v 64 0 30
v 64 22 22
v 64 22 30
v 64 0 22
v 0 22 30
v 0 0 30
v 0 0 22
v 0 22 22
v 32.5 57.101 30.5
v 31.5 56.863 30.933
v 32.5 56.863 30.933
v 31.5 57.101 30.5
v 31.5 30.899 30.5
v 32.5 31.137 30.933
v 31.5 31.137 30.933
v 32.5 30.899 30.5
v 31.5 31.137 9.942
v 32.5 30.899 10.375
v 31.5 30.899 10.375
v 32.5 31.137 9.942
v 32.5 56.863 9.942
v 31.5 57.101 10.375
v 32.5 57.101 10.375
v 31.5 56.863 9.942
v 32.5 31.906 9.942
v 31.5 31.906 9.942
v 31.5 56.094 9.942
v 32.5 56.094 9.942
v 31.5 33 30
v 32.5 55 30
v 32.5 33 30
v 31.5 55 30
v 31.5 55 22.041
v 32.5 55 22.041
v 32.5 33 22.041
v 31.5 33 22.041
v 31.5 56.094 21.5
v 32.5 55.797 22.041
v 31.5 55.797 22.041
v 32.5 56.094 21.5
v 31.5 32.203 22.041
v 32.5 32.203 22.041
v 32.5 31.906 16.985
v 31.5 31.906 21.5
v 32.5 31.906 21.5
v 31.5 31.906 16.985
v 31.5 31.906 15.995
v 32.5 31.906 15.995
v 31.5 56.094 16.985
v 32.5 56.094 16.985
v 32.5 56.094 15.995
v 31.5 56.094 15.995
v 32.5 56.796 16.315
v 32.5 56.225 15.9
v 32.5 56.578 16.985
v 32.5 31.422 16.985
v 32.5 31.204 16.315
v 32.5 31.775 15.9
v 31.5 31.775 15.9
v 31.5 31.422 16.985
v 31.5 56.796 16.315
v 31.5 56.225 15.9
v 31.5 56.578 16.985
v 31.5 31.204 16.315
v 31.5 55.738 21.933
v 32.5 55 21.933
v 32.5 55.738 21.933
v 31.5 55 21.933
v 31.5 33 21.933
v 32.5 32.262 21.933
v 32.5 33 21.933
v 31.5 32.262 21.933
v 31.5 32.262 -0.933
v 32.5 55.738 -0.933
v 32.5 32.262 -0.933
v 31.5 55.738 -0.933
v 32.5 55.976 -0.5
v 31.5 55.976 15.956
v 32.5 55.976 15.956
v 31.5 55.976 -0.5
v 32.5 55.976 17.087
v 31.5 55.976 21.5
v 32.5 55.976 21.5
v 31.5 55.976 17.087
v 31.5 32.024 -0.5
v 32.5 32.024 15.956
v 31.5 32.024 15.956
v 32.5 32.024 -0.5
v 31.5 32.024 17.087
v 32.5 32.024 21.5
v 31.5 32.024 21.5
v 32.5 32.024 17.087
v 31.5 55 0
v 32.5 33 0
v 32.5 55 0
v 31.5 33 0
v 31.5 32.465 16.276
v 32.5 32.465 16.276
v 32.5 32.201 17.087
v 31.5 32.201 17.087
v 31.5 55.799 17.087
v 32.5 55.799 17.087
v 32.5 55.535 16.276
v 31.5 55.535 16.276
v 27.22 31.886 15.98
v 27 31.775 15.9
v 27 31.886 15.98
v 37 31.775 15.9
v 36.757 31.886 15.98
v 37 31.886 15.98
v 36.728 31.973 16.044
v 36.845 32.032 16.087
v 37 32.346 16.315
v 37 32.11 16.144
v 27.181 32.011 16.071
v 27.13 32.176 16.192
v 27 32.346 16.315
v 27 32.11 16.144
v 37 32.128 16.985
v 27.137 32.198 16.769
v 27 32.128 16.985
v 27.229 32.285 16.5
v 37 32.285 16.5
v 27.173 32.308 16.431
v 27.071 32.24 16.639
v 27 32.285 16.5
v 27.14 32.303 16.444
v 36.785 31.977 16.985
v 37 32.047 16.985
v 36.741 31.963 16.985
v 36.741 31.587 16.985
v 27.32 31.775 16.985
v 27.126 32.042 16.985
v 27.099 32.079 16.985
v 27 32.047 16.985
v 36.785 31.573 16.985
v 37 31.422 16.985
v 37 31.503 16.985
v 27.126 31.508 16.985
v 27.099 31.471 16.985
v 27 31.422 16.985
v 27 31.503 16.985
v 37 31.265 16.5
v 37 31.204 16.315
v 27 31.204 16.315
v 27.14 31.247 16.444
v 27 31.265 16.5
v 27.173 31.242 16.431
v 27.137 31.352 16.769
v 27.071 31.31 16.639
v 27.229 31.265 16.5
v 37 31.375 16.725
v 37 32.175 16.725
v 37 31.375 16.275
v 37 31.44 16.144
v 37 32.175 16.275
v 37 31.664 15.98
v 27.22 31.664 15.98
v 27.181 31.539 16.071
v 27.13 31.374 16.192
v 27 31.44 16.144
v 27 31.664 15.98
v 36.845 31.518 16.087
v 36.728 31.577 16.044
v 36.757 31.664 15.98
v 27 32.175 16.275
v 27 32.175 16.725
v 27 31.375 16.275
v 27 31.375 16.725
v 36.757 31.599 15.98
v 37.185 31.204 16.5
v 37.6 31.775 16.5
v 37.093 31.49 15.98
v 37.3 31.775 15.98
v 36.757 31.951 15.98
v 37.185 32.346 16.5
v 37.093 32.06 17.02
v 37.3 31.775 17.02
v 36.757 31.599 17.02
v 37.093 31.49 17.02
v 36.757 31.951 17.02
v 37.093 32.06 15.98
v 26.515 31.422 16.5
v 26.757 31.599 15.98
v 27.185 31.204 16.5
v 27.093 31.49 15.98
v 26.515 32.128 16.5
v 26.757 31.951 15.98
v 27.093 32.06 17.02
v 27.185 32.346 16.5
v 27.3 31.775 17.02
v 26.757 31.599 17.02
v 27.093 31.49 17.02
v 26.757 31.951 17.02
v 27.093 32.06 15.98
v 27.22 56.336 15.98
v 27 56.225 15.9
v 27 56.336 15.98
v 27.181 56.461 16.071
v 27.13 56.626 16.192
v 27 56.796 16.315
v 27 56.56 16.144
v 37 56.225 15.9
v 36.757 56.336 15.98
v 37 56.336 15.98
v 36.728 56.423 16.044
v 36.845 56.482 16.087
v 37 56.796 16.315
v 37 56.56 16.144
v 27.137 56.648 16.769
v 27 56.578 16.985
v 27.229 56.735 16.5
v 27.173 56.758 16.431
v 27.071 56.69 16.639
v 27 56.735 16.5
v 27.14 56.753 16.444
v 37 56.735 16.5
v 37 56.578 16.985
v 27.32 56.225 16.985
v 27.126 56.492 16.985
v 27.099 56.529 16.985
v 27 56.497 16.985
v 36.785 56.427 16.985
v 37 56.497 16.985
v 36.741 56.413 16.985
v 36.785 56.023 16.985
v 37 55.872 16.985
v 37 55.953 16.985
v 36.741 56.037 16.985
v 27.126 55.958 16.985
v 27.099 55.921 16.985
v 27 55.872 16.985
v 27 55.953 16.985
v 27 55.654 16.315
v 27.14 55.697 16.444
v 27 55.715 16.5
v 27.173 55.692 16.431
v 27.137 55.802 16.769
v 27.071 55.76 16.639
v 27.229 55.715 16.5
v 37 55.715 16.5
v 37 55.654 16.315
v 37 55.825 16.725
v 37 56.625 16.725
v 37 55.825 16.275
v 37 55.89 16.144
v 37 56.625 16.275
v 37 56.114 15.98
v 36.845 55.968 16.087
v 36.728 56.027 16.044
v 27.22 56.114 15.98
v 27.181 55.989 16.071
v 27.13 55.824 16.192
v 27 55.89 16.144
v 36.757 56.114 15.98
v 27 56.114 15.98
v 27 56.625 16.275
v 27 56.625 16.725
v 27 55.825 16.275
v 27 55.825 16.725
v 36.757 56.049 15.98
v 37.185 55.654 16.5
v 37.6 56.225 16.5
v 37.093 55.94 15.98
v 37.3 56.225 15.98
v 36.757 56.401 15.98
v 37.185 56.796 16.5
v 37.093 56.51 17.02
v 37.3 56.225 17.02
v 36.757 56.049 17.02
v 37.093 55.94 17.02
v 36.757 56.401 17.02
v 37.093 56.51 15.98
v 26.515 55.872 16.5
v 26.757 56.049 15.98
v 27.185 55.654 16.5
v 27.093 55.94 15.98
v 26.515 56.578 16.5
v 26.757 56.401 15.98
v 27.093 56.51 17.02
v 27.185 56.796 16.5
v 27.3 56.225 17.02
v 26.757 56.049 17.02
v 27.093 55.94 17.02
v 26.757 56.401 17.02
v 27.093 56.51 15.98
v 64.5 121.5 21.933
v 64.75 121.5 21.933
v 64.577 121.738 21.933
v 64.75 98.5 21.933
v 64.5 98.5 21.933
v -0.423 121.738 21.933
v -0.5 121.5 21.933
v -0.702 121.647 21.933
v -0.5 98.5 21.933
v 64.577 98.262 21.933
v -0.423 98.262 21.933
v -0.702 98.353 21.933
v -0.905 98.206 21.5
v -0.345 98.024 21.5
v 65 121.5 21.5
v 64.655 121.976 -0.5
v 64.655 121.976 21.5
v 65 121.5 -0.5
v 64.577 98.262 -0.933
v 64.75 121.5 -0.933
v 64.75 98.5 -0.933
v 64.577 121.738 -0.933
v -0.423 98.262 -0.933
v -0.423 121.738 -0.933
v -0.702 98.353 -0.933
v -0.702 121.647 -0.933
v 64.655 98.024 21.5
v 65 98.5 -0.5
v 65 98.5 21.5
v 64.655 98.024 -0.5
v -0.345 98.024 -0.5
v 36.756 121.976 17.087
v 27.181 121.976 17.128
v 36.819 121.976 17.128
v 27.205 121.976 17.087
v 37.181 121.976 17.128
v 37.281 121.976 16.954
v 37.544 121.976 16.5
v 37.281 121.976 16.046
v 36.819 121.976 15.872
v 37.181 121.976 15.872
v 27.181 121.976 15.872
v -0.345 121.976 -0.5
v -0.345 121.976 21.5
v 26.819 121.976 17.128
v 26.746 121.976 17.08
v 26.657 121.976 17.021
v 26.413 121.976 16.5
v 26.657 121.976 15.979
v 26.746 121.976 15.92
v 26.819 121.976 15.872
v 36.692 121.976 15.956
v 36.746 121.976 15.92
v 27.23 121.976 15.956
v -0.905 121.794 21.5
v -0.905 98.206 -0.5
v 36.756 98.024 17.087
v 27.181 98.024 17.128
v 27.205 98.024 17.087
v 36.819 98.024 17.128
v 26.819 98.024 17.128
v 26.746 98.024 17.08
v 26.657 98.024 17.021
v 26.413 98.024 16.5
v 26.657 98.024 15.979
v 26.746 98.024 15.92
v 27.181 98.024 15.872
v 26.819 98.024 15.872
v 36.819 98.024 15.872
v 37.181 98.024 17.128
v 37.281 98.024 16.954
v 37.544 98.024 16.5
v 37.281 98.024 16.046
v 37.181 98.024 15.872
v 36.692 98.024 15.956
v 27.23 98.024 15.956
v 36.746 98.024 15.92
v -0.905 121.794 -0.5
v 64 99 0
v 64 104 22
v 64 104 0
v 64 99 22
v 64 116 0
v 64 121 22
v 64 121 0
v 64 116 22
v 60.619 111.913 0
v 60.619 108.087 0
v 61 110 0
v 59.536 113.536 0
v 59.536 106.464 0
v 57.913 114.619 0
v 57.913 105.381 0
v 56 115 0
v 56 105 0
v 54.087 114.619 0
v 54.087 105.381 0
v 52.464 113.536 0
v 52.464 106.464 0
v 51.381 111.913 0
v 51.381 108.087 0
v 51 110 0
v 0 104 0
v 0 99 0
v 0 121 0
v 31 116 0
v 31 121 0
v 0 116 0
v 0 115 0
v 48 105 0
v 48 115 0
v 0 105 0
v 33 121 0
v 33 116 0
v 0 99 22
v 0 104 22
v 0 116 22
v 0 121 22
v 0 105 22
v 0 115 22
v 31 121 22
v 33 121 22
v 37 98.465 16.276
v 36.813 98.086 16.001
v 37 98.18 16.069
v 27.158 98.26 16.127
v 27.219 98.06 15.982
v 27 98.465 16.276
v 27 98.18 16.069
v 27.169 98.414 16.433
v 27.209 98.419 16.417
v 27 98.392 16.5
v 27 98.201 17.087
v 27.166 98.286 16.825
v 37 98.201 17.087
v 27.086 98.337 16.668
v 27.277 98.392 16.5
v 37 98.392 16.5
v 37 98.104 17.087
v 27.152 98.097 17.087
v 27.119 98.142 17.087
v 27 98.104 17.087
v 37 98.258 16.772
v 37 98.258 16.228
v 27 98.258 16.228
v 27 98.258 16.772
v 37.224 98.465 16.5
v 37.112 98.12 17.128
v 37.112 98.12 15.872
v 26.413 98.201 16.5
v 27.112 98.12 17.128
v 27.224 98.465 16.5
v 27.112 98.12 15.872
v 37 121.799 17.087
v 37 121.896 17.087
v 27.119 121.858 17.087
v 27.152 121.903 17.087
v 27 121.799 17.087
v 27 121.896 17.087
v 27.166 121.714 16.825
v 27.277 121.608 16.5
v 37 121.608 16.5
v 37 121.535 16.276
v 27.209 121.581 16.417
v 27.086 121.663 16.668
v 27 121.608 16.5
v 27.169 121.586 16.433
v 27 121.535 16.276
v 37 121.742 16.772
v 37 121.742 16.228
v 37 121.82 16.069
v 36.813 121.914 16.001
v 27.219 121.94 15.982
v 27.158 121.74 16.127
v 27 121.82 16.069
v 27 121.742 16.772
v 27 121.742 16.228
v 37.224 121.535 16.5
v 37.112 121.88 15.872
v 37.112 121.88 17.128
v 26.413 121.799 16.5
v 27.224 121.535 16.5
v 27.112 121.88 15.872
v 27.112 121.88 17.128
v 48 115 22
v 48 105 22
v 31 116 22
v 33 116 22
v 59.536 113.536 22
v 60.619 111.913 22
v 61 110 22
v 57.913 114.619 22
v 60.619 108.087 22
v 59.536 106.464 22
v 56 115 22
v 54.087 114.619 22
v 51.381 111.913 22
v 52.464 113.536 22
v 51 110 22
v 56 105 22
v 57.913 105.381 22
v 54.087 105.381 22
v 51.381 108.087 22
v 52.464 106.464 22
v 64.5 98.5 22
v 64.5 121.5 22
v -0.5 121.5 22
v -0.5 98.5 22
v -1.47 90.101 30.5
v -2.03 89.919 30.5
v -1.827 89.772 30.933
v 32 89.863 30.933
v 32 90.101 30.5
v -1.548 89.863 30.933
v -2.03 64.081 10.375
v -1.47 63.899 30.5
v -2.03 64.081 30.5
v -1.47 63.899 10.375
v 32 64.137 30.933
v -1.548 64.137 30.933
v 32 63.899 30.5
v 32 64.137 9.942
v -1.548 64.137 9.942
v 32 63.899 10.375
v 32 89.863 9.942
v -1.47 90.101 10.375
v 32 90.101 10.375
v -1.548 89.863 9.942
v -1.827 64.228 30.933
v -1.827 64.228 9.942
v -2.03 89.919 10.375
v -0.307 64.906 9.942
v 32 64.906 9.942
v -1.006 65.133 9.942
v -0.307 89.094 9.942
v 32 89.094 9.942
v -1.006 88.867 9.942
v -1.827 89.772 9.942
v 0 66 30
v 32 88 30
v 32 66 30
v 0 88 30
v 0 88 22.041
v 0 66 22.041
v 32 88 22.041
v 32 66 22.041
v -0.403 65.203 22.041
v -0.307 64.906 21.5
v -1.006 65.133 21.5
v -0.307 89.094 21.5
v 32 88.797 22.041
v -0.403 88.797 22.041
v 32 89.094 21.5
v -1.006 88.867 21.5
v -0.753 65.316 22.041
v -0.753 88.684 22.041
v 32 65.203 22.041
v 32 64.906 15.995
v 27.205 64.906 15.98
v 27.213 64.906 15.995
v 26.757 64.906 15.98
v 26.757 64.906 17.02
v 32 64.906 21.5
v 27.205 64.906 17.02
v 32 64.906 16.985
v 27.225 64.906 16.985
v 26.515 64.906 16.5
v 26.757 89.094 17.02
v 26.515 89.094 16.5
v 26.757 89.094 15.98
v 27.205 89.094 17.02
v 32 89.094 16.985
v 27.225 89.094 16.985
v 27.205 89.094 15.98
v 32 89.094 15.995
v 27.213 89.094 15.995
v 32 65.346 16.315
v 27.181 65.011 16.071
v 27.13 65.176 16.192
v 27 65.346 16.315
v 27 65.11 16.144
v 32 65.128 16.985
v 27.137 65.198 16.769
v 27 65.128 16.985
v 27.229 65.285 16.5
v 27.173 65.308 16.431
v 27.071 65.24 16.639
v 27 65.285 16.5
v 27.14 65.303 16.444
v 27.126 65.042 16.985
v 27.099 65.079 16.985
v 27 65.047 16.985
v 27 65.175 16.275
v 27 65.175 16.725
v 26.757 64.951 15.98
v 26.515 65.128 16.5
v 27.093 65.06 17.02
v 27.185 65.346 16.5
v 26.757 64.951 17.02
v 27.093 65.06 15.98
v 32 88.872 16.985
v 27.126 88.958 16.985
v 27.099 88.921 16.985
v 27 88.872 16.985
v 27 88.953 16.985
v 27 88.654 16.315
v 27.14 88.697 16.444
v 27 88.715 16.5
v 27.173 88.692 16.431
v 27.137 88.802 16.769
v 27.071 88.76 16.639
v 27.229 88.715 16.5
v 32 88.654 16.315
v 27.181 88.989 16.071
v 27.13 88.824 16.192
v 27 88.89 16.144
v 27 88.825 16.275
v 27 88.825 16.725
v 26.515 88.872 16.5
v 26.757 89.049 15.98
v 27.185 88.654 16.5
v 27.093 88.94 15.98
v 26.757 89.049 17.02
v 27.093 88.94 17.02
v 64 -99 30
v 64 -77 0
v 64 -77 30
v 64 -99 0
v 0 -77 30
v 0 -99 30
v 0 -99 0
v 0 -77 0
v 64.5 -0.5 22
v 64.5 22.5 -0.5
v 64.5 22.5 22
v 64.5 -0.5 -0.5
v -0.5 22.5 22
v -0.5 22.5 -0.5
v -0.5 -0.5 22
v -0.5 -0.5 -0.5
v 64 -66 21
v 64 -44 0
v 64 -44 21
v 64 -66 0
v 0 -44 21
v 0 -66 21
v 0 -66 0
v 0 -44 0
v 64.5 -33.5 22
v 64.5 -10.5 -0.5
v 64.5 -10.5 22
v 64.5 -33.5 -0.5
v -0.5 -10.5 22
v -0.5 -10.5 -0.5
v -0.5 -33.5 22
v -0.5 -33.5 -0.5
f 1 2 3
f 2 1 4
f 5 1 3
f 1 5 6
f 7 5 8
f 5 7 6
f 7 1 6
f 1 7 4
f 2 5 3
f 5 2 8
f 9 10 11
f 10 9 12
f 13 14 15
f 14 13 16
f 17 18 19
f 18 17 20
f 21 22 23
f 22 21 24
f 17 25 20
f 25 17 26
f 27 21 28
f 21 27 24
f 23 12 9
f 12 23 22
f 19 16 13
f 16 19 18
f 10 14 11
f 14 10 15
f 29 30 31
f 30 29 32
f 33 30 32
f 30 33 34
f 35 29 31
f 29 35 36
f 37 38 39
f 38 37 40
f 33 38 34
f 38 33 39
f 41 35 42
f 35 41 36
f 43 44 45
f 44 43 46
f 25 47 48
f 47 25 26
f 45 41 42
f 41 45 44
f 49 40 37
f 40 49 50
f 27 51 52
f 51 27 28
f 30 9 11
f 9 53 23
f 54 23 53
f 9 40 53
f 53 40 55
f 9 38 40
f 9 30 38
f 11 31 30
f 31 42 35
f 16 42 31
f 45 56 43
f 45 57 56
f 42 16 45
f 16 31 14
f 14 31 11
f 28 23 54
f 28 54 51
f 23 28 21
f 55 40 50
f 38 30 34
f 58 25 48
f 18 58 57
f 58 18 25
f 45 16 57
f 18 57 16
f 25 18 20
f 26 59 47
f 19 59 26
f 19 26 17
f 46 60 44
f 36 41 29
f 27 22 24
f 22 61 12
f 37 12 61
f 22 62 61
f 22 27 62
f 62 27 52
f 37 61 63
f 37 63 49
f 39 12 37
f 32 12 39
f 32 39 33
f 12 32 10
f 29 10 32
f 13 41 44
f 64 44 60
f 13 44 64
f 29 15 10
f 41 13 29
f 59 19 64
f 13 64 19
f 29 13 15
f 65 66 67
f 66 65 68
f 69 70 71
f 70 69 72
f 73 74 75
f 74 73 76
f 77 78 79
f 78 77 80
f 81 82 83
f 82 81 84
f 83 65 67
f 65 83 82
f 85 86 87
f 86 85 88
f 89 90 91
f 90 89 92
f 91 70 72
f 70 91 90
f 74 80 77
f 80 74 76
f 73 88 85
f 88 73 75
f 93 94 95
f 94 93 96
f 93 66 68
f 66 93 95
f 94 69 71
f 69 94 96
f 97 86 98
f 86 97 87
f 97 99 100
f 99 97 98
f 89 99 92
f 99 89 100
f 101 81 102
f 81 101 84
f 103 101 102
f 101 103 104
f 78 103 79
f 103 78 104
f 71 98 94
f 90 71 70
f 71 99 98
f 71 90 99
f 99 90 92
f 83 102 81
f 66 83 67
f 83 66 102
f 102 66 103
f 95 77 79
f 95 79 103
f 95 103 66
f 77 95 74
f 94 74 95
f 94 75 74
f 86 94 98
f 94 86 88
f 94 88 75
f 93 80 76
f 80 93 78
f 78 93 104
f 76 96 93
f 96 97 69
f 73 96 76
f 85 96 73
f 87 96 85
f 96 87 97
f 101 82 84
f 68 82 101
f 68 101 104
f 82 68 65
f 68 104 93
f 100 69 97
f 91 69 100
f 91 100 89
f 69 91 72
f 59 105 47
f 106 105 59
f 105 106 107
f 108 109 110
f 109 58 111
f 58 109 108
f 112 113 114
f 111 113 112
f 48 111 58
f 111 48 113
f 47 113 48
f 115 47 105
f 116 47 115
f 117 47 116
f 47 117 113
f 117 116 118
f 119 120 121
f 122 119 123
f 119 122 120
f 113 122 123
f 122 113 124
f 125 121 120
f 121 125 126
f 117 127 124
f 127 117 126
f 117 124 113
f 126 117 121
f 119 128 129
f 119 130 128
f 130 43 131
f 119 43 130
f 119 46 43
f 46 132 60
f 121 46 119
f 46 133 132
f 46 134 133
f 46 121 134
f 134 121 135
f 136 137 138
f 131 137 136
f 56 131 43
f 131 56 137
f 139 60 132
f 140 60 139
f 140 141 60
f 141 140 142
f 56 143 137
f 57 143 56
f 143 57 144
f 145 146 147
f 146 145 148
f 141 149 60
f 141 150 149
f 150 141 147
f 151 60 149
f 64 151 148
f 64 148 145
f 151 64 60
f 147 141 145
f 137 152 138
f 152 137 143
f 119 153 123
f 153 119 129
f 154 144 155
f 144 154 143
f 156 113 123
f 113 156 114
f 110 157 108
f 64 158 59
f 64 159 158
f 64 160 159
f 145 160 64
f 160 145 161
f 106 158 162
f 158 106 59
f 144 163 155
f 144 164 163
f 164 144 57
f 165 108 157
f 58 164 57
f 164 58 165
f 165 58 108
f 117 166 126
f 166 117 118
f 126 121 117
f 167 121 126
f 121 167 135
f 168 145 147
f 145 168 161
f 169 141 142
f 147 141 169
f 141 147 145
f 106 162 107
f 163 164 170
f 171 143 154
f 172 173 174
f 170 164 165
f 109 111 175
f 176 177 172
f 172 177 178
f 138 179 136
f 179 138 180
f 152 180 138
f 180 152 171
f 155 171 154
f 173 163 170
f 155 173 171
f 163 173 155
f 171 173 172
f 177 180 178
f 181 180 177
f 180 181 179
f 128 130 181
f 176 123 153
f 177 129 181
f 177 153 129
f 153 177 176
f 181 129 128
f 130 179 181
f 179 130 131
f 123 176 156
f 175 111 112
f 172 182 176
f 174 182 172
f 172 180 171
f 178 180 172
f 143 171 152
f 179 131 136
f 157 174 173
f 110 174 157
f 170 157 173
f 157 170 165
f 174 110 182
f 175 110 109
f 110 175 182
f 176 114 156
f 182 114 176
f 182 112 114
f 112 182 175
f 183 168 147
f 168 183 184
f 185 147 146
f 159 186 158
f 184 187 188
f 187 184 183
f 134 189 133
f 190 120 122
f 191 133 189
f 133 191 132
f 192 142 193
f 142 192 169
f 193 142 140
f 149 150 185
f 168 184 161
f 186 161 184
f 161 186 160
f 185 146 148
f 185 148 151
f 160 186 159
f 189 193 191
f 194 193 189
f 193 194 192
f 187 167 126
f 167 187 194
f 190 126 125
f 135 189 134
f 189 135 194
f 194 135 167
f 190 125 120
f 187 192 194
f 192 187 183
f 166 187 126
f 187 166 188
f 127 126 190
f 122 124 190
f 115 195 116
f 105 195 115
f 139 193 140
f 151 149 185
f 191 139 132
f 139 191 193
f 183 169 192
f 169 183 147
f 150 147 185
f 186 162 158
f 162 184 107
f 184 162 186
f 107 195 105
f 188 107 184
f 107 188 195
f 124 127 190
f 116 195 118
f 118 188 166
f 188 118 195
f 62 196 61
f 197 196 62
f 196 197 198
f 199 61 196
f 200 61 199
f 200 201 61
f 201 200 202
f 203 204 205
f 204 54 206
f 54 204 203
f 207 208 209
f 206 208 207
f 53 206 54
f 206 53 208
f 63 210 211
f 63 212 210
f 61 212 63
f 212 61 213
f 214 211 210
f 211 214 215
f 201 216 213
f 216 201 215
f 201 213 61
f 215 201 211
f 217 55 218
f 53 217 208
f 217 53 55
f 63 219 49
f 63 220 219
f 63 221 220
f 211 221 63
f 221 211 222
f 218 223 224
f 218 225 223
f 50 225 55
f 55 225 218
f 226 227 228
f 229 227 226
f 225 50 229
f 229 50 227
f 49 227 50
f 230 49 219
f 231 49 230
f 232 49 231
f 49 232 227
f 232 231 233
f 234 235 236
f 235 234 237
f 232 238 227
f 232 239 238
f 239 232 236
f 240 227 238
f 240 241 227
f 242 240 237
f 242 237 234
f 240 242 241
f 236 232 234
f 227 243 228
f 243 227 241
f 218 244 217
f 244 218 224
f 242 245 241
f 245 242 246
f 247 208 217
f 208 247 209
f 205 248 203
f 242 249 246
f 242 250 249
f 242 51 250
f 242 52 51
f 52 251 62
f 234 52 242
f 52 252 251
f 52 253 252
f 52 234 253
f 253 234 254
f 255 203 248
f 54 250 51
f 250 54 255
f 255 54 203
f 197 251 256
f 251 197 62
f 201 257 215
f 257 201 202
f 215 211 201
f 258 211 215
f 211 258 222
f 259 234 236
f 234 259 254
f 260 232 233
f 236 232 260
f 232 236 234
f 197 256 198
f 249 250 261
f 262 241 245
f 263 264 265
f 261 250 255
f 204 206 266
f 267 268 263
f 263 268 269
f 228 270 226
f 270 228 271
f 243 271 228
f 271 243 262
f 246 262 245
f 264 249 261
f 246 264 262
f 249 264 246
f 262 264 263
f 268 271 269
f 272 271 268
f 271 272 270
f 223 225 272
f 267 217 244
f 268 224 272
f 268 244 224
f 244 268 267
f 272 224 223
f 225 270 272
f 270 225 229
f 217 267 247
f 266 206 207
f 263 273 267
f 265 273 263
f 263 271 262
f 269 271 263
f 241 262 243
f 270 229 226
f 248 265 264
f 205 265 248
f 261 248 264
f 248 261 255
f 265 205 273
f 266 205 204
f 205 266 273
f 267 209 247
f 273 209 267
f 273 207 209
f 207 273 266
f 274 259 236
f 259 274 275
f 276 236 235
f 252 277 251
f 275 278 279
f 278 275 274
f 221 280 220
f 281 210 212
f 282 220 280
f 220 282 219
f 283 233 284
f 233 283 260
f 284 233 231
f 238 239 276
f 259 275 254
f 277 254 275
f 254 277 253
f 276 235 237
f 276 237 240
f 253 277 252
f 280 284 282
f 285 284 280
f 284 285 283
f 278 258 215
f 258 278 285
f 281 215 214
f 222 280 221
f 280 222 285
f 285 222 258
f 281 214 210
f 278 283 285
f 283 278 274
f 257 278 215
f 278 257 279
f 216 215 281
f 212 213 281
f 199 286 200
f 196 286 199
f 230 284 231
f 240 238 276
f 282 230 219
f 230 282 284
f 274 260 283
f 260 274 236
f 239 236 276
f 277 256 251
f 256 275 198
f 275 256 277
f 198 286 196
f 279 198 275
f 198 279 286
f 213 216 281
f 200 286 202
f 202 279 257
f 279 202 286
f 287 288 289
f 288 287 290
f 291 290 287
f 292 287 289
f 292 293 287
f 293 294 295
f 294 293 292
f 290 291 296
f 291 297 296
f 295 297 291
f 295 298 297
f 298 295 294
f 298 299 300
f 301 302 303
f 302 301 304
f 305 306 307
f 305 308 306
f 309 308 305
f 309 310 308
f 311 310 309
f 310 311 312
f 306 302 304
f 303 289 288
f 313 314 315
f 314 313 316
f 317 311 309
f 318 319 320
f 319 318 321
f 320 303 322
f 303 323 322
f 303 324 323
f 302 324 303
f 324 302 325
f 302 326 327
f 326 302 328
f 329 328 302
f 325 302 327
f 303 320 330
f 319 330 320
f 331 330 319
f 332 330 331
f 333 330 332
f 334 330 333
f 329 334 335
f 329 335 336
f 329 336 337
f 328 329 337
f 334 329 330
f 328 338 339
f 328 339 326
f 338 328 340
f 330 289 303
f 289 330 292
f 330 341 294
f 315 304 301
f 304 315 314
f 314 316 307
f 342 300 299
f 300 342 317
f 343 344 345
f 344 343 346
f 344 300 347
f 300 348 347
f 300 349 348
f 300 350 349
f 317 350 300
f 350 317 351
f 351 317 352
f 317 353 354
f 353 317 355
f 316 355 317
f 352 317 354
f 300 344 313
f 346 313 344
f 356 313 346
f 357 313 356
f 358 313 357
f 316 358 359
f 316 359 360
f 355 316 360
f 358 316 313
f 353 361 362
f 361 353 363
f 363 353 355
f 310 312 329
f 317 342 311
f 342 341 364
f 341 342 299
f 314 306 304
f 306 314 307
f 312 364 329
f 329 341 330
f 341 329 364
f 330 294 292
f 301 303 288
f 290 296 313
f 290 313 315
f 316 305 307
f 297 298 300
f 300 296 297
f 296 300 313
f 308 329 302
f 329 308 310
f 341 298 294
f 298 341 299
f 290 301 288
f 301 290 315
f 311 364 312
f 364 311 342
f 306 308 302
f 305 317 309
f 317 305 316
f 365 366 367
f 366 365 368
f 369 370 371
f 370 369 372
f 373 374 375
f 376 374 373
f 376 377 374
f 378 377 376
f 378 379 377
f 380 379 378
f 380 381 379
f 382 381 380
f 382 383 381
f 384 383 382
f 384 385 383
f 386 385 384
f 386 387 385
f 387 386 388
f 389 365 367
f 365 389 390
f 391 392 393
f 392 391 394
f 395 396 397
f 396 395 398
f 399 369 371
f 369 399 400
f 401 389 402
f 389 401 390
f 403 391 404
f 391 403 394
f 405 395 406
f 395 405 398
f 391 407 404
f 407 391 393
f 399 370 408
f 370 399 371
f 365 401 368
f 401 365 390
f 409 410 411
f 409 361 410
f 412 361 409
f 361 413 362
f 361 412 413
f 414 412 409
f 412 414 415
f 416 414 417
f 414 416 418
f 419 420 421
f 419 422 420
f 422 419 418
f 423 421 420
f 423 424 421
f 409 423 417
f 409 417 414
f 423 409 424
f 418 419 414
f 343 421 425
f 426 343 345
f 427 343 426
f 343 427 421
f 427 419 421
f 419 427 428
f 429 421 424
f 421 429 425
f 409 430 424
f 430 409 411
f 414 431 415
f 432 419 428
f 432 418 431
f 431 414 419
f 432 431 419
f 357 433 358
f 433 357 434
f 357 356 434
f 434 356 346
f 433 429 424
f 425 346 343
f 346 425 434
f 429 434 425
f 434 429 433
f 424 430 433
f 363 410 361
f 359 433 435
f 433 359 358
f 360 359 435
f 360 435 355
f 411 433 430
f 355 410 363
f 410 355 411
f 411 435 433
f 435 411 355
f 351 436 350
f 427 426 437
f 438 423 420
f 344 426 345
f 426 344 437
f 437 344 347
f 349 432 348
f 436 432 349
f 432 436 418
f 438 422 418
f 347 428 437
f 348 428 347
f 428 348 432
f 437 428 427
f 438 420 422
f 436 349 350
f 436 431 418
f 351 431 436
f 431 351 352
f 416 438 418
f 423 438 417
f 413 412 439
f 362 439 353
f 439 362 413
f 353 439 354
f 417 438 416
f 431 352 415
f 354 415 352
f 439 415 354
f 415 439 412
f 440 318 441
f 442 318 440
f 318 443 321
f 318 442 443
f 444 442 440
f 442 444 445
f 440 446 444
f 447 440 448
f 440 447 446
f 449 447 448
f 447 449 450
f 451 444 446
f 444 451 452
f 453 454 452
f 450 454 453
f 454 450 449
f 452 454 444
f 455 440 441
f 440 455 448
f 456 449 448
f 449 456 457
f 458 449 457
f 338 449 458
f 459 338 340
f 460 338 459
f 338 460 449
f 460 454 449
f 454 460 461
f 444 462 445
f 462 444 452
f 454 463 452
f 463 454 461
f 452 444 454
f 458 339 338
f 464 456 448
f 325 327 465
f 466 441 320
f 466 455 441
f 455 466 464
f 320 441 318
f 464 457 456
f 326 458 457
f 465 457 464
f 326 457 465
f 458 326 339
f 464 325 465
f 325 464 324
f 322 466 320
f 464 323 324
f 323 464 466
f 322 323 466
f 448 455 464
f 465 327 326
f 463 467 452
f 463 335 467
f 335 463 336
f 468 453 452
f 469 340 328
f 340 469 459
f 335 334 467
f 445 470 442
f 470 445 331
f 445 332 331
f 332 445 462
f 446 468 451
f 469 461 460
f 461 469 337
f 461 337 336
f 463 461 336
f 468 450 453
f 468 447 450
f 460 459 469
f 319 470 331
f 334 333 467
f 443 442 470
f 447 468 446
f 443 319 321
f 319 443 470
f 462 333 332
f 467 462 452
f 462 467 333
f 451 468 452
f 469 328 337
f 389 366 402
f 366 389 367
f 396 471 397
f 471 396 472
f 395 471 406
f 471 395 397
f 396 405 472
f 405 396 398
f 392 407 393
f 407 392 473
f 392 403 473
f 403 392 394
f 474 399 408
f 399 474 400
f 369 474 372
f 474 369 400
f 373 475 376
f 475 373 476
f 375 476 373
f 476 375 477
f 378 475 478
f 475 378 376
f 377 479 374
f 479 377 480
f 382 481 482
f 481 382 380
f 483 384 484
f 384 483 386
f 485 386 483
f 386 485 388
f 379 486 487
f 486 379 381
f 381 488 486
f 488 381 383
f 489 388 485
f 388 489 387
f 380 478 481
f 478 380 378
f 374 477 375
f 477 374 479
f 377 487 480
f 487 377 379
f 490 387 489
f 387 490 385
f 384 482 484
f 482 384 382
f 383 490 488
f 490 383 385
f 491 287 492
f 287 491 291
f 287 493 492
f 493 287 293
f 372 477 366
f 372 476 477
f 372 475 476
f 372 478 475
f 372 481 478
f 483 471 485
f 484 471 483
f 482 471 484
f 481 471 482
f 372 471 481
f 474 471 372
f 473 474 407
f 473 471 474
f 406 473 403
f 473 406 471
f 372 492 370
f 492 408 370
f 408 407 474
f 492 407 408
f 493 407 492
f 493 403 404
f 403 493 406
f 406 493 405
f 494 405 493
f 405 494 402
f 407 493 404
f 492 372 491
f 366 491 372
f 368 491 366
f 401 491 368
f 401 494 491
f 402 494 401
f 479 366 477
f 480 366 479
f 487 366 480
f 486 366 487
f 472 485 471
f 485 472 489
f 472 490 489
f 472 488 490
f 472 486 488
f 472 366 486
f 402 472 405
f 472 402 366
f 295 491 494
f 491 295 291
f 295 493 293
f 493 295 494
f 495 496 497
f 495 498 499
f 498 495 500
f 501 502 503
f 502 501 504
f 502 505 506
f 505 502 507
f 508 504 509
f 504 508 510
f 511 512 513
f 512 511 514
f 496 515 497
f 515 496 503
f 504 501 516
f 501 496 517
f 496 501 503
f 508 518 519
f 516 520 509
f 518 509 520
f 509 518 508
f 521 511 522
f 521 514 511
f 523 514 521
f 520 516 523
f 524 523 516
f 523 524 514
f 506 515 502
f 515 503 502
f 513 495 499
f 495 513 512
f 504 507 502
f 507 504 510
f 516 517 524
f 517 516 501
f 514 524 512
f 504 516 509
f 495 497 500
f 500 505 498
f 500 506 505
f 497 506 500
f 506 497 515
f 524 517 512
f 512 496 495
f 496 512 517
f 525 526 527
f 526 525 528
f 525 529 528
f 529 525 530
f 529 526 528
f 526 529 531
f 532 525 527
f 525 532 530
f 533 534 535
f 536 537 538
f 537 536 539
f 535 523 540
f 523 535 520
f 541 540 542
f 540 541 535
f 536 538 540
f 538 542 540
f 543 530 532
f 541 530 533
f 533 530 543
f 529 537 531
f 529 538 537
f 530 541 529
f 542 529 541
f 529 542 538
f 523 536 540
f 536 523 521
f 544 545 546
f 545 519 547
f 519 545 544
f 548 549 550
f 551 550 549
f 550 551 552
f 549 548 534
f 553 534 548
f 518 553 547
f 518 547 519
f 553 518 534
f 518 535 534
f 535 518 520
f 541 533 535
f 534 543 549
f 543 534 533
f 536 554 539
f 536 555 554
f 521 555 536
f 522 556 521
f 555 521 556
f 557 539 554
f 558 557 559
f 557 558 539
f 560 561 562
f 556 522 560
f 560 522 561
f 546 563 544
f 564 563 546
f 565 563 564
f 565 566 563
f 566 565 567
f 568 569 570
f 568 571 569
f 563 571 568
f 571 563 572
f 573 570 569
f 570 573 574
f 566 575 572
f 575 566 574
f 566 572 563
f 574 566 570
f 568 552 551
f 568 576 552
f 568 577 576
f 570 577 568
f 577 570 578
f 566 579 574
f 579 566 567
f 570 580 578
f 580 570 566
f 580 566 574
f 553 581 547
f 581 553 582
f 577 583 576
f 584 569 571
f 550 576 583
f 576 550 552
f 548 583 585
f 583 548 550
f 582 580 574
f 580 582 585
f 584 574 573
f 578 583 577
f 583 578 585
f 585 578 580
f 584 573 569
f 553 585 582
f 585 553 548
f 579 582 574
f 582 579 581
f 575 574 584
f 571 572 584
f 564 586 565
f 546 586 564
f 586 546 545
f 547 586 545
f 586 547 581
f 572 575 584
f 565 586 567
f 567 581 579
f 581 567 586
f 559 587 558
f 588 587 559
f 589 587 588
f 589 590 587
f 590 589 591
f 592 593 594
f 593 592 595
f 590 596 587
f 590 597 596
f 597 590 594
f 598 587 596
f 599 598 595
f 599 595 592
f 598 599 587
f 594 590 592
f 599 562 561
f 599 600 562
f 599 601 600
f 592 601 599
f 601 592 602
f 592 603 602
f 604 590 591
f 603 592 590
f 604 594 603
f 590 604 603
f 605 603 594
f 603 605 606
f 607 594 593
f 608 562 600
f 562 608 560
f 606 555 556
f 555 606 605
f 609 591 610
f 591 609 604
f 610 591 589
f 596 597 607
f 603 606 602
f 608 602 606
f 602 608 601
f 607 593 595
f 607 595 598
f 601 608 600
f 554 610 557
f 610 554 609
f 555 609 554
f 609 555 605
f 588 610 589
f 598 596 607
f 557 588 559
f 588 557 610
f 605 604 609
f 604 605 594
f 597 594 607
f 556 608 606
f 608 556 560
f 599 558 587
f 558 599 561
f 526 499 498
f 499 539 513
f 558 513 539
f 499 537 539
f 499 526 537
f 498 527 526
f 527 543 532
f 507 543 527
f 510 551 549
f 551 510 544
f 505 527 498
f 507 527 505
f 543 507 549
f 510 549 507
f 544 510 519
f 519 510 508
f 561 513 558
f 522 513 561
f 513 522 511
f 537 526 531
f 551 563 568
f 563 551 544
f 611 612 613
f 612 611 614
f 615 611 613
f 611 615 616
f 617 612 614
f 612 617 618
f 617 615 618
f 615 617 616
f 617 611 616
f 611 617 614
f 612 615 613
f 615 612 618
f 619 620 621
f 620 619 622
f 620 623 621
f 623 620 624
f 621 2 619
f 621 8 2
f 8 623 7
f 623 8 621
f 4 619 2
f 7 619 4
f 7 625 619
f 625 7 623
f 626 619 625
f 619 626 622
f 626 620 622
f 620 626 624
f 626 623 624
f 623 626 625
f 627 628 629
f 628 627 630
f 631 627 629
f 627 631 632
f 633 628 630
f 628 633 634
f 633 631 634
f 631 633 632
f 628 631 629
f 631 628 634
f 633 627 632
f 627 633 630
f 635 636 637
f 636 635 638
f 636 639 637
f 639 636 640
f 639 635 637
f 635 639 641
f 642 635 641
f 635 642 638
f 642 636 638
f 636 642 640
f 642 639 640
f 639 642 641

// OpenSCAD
// file: 05_locker.scad
include <00_main.scad>;

use <03_first_shell.scad>;
use <04_second_shell.scad>;


module _pill_core_locker(offset=0) {
    rotate([0,90,0])
    cylinder(h=locker_x, r=locker_r+offset, center=true);
}

module 05_pill_locker(offset=0) {    
    _pill_core_locker(offset);
    
    translate([locker_x/2,0,0])
    sphere(r=locker_r+offset);
    
    translate([-locker_x/2,0,0])
    sphere(r=locker_r+offset);
}


module 05_pill_locker_mid_position(with_offset=false) {
    mid_overlay = size_z * (1 - top_overlay + (top_overlay - top_part)/2);
    offset_val = with_offset ? second_shell_offset : 0;
    shift_y = second_shell_offset + size_wall + locker_y;

    translate([
        size_x/2,
        -shift_y,
        mid_overlay])
    05_pill_locker(offset=offset_val);
    
    translate([
        size_x/2,
        size_y + shift_y,
        mid_overlay])
    05_pill_locker(offset=offset_val);
}


// DEVELOPING ################################

module 05_slide_with_locker() {
    size_debug = size_wall * 10;
    alpha_debug = 0.5;

    intersection() {
        04_second_shell();
        01_debug_slice();
    }

    intersection() {
        difference() {
            03_first_shell();
            05_pill_locker_mid_position(with_offset=true);
        }
        01_debug_slice();
    }

    intersection() {
        translate([0,0,0]);
        05_pill_locker();
        01_debug_slice();
    }

    05_pill_locker_mid_position();
}

module 05_developing() {
    debug_shift = 10;
    steps = 4;  // decrease step number for better understanding

    translate([0, - (steps - 0) * (debug_shift * 1.5), 0]) {
        _pill_core_locker();
    }

    translate([0, - (steps - 1) * (debug_shift * 1.5), 0]) {
        05_pill_locker();
    }

    translate([0, - (steps - 2) * (debug_shift * 1.5), 0]) {
        05_pill_locker(offset=0.1);
    }

    translate([0, - (steps - 3) * (debug_shift * 1.5), 0]) {
        tmp = 0.1;
        
        difference() {
            #cube([6,2,2]);
            05_pill_locker(offset=tmp);
        }
        
        intersection() {
            cube([6,2,2]);
            05_pill_locker();
        }
    }

    translate([0, - (steps - 4) * (debug_shift * 1.5), 0]) {
        05_slide_with_locker();
    }

}

// Do not forget put all structures under a comment in 00_main.scad
05_developing();
// file: 04_second_shell.scad
include <00_main.scad>;
use <03_first_shell.scad>;

// next line is a debug_line - uncomment to use
// second_shell_cutted_top = false; //rewrite var from 00_main


module _secord_core_shell() {
    if (second_shell_cutted_top) {
        difference() {
            translate([0,0,size_z*(1-top_overlay)])
            scale([1,1,top_overlay])
            01_min_vol();

            translate([
                -size_x/4,
                -size_y/4,
                size_z - second_shell_offset - size_wall
            ])
            scale([1.5, 1.5, 1])
            01_min_vol();
        }
    } else {
        translate([0,0,size_z*(1-top_overlay)])
        scale([1,1,top_overlay])
        01_min_vol();
    }
}

module _secord_core_offset_shell() {
    minkowski() {
       _secord_core_shell();
       cube(second_shell_offset*2, center = true); 
    }
}

module _second_solid_shell() {
    minkowski() {
        _secord_core_offset_shell();
        cube(size_wall*3, center = true);
        sphere(d=size_wall);
    }
}

module _second_pre_shell() {
    difference() {
        _second_solid_shell();
        01_min_vol();
    }
}

module 04_second_shell() {
    difference() {
        _second_pre_shell();
        03_first_solid_shell(second_shell_offset);
    }
}

module 04_slide() {
    size_debug = size_wall * 10;
    alpha_debug = 0.5;

    intersection() {
        04_second_shell();
        01_debug_slice();
    }

    intersection() {
        03_first_shell();
        01_debug_slice();
    }

    // RED - first shell
    translate([size_x/2,0,size_z])
    color([1,0,0,alpha_debug])
    cube([size_debug,size_debug,size_wall]);

    if (!second_shell_cutted_top) {
        // GREEN - second_shell_offset
        translate([size_x/2+size_wall,-size_wall,size_z+size_wall])
        color([0,1,0,alpha_debug])
        cube([size_debug,size_debug,second_shell_offset]);

        // BLUE - second shell
        translate([size_x/2+size_wall*2,-size_wall*2,size_z+size_wall+second_shell_offset])
        color([0,0,1,alpha_debug])
        cube([size_debug,size_debug,size_wall]);
    }
}

// DEVELOPING ################################

module 04_developing() {
    steps = 6;  // decrease step number for better understanding

    translate([0, - (steps - 0) * (size_y * 1.5), 0]) {
        #01_min_vol();
    }

    translate([0, - (steps - 1) * (size_y * 1.5), 0]) {
        _secord_core_shell();
        #01_min_vol();
    }

    translate([0, - (steps - 2) * (size_y * 1.5), 0]) {
        _secord_core_offset_shell();
        #01_min_vol();
    }

    translate([0, - (steps - 3) * (size_y * 1.5), 0]) {
        _second_solid_shell();
    }

    translate([0, - (steps - 4) * (size_y * 1.5), 0]) {
        _second_pre_shell();
    }

    translate([0, - (steps - 5) * (size_y * 1.5), 0]) {
        04_second_shell();
    }

    translate([0, - (steps - 6) * (size_y * 1.5), 0]) {
        04_slide();   
    }
}

// Do not forget put all structures under a comment in 00_main.scad
04_developing();
// file: 03_first_shell.scad
include <00_main.scad>;
use <01_shared.scad>;
use <02_internal_walls.scad>;


module 03_first_solid_shell(second_shell_offset=0) {
    minkowski() {
        01_min_bottom_vol();
        cube(size_wall, center = true);
        sphere(d=size_wall+second_shell_offset*2);
    }
}

module 03_first_shell() {
    difference(){
        03_first_solid_shell();
        01_min_vol();
    }
}


// DEVELOPING ################################

module 03_developing() {
    steps = 5;  // decrease step number for better understanding

    translate([0, - (steps - 0) * (size_y * 1.5), 0]) {
        #01_min_vol();
    }

    translate([0, - (steps - 1) * (size_y * 1.5), 0]) {
        #01_min_vol();
        01_min_bottom_vol();
    }

    translate([0, - (steps - 2) * (size_y * 1.5), 0]) {
        03_first_solid_shell();
    }

    translate([0, - (steps - 3) * (size_y * 1.5), 0]) {
        03_first_shell();
    }

    translate([0, - (steps - 4) * (size_y * 1.5), 0]) {
        02_internal_walls();
    }

    translate([0, - (steps - 5) * (size_y * 1.5), 0]) {
        union() {
            03_first_shell();
            02_internal_walls();
        }
    }
}

// Do not forget put all structures under a comment in 00_main.scad
03_developing();
// file: 06_assembling.scad
include <00_main.scad>;

use <02_internal_walls.scad>
use <03_first_shell.scad>;
use <04_second_shell.scad>;
use <05_locker.scad>;

module 05_first_final_shell() {
    if (with_locker) {
        difference() {
            03_first_shell();
            05_pill_locker_mid_position(with_offset=true);
        }
    }
    else {
        03_first_shell();
    }
    02_internal_walls();
}

module 05_second_final_shell() {
    04_second_shell();
    if (with_locker) {
        05_pill_locker_mid_position(with_offset=false);
    }
}

module 05_preview() {
    00_initial_forms(); #01_min_vol();

    translate([0, size_y * 1.5, 0])
    if (with_locker) {
        05_slide_with_locker();
    } else {
        04_slide();
    }

    translate([0, size_y * 4.5, 0])
    05_first_final_shell();

    translate([0, size_y * 3, 0])
    intersection(){
        05_second_final_shell();
        cube([size_x,size_y*3,size_z*3], center=true);
    }
}


// DEVELOPING ################################

module 05_developing() {    
    05_first_final_shell();

    mirror([0, 0, 1])
    translate([0,size_y*1.5,-size_z])
    05_second_final_shell();
}

// Do not forget put all structures under a comment in 00_main.scad
05_developing();
// file: 01_shared.scad
include <00_main.scad>;


module 01_min_vol() {
    cube([size_x,size_y,size_z]);
}

module 01_min_bottom_vol() {
    scale([1,1,1 - top_part])
    01_min_vol();
}

module 01_debug_slice() {
    translate([size_x/2,-size_wall*3,-size_wall*3])
    cube([size_wall, size_y*3, size_z*3], center = true);
}
// file: 00_main.scad
use <01_shared.scad>;
use <06_assembling.scad>;


// PART_0 ################################

module 00_initial_forms() {
translate([0,0,0]) 
cube([64,5,30]);

translate([0,6,0])
cube([48,10,30]);

translate([0,17,0])
cube([31,5,30]);

translate([31 + 2,17,0])
cube([31,5,30]);
    
translate([56,11,0])
cylinder(30, r=5);
}


//00_initial_forms();


// PART_1 ################################

size_x = 64;
size_y = 22; 
size_z = 30;


//00_initial_forms(); #01_min_vol();


// PART_2 ################################

size_wall = 1;
second_shell_offset = 0.125;

top_part = 0.3;
top_overlay = 0.6;
second_shell_cutted_top = true;

with_locker = true;
locker_x = 10;
locker_r = 0.6;
locker_y = 0.1;


05_preview();


// PART_3 ################################

//$fn=60; 05_first_final_shell();
//$fn=60; 05_second_final_shell();
// main file
include <00_main.scad>;
use <01_shared.scad>;


module _min_vol_n_half_wall() {
    minkowski() {
        union() {
            01_min_bottom_vol();
            translate([0,0,size_wall/2])
            01_min_bottom_vol();
        }
        cube(size_wall, center = true);
    }
}

module 02_internal_walls() {
    difference() {
        _min_vol_n_half_wall();
        00_initial_forms();
    }
}


// DEVELOPING ################################

module 02_developing() {
    steps = 3;  // decrease step number for better understanding

    translate([0, - (steps - 0) * (size_y * 1.5), 0]) {
        00_initial_forms();
        #01_min_vol();
    }

    translate([0, - (steps - 1) * (size_y * 1.5), 0]) {
        01_min_bottom_vol();
    }

    translate([0, - (steps - 2) * (size_y * 1.5), 0]) {
        _min_vol_n_half_wall();
    }

    translate([0, - (steps - 3) * (size_y * 1.5), 0]) {
        02_internal_walls();
    }
}

// Do not forget put all structures under a comment in 00_main.scad
02_developing();
